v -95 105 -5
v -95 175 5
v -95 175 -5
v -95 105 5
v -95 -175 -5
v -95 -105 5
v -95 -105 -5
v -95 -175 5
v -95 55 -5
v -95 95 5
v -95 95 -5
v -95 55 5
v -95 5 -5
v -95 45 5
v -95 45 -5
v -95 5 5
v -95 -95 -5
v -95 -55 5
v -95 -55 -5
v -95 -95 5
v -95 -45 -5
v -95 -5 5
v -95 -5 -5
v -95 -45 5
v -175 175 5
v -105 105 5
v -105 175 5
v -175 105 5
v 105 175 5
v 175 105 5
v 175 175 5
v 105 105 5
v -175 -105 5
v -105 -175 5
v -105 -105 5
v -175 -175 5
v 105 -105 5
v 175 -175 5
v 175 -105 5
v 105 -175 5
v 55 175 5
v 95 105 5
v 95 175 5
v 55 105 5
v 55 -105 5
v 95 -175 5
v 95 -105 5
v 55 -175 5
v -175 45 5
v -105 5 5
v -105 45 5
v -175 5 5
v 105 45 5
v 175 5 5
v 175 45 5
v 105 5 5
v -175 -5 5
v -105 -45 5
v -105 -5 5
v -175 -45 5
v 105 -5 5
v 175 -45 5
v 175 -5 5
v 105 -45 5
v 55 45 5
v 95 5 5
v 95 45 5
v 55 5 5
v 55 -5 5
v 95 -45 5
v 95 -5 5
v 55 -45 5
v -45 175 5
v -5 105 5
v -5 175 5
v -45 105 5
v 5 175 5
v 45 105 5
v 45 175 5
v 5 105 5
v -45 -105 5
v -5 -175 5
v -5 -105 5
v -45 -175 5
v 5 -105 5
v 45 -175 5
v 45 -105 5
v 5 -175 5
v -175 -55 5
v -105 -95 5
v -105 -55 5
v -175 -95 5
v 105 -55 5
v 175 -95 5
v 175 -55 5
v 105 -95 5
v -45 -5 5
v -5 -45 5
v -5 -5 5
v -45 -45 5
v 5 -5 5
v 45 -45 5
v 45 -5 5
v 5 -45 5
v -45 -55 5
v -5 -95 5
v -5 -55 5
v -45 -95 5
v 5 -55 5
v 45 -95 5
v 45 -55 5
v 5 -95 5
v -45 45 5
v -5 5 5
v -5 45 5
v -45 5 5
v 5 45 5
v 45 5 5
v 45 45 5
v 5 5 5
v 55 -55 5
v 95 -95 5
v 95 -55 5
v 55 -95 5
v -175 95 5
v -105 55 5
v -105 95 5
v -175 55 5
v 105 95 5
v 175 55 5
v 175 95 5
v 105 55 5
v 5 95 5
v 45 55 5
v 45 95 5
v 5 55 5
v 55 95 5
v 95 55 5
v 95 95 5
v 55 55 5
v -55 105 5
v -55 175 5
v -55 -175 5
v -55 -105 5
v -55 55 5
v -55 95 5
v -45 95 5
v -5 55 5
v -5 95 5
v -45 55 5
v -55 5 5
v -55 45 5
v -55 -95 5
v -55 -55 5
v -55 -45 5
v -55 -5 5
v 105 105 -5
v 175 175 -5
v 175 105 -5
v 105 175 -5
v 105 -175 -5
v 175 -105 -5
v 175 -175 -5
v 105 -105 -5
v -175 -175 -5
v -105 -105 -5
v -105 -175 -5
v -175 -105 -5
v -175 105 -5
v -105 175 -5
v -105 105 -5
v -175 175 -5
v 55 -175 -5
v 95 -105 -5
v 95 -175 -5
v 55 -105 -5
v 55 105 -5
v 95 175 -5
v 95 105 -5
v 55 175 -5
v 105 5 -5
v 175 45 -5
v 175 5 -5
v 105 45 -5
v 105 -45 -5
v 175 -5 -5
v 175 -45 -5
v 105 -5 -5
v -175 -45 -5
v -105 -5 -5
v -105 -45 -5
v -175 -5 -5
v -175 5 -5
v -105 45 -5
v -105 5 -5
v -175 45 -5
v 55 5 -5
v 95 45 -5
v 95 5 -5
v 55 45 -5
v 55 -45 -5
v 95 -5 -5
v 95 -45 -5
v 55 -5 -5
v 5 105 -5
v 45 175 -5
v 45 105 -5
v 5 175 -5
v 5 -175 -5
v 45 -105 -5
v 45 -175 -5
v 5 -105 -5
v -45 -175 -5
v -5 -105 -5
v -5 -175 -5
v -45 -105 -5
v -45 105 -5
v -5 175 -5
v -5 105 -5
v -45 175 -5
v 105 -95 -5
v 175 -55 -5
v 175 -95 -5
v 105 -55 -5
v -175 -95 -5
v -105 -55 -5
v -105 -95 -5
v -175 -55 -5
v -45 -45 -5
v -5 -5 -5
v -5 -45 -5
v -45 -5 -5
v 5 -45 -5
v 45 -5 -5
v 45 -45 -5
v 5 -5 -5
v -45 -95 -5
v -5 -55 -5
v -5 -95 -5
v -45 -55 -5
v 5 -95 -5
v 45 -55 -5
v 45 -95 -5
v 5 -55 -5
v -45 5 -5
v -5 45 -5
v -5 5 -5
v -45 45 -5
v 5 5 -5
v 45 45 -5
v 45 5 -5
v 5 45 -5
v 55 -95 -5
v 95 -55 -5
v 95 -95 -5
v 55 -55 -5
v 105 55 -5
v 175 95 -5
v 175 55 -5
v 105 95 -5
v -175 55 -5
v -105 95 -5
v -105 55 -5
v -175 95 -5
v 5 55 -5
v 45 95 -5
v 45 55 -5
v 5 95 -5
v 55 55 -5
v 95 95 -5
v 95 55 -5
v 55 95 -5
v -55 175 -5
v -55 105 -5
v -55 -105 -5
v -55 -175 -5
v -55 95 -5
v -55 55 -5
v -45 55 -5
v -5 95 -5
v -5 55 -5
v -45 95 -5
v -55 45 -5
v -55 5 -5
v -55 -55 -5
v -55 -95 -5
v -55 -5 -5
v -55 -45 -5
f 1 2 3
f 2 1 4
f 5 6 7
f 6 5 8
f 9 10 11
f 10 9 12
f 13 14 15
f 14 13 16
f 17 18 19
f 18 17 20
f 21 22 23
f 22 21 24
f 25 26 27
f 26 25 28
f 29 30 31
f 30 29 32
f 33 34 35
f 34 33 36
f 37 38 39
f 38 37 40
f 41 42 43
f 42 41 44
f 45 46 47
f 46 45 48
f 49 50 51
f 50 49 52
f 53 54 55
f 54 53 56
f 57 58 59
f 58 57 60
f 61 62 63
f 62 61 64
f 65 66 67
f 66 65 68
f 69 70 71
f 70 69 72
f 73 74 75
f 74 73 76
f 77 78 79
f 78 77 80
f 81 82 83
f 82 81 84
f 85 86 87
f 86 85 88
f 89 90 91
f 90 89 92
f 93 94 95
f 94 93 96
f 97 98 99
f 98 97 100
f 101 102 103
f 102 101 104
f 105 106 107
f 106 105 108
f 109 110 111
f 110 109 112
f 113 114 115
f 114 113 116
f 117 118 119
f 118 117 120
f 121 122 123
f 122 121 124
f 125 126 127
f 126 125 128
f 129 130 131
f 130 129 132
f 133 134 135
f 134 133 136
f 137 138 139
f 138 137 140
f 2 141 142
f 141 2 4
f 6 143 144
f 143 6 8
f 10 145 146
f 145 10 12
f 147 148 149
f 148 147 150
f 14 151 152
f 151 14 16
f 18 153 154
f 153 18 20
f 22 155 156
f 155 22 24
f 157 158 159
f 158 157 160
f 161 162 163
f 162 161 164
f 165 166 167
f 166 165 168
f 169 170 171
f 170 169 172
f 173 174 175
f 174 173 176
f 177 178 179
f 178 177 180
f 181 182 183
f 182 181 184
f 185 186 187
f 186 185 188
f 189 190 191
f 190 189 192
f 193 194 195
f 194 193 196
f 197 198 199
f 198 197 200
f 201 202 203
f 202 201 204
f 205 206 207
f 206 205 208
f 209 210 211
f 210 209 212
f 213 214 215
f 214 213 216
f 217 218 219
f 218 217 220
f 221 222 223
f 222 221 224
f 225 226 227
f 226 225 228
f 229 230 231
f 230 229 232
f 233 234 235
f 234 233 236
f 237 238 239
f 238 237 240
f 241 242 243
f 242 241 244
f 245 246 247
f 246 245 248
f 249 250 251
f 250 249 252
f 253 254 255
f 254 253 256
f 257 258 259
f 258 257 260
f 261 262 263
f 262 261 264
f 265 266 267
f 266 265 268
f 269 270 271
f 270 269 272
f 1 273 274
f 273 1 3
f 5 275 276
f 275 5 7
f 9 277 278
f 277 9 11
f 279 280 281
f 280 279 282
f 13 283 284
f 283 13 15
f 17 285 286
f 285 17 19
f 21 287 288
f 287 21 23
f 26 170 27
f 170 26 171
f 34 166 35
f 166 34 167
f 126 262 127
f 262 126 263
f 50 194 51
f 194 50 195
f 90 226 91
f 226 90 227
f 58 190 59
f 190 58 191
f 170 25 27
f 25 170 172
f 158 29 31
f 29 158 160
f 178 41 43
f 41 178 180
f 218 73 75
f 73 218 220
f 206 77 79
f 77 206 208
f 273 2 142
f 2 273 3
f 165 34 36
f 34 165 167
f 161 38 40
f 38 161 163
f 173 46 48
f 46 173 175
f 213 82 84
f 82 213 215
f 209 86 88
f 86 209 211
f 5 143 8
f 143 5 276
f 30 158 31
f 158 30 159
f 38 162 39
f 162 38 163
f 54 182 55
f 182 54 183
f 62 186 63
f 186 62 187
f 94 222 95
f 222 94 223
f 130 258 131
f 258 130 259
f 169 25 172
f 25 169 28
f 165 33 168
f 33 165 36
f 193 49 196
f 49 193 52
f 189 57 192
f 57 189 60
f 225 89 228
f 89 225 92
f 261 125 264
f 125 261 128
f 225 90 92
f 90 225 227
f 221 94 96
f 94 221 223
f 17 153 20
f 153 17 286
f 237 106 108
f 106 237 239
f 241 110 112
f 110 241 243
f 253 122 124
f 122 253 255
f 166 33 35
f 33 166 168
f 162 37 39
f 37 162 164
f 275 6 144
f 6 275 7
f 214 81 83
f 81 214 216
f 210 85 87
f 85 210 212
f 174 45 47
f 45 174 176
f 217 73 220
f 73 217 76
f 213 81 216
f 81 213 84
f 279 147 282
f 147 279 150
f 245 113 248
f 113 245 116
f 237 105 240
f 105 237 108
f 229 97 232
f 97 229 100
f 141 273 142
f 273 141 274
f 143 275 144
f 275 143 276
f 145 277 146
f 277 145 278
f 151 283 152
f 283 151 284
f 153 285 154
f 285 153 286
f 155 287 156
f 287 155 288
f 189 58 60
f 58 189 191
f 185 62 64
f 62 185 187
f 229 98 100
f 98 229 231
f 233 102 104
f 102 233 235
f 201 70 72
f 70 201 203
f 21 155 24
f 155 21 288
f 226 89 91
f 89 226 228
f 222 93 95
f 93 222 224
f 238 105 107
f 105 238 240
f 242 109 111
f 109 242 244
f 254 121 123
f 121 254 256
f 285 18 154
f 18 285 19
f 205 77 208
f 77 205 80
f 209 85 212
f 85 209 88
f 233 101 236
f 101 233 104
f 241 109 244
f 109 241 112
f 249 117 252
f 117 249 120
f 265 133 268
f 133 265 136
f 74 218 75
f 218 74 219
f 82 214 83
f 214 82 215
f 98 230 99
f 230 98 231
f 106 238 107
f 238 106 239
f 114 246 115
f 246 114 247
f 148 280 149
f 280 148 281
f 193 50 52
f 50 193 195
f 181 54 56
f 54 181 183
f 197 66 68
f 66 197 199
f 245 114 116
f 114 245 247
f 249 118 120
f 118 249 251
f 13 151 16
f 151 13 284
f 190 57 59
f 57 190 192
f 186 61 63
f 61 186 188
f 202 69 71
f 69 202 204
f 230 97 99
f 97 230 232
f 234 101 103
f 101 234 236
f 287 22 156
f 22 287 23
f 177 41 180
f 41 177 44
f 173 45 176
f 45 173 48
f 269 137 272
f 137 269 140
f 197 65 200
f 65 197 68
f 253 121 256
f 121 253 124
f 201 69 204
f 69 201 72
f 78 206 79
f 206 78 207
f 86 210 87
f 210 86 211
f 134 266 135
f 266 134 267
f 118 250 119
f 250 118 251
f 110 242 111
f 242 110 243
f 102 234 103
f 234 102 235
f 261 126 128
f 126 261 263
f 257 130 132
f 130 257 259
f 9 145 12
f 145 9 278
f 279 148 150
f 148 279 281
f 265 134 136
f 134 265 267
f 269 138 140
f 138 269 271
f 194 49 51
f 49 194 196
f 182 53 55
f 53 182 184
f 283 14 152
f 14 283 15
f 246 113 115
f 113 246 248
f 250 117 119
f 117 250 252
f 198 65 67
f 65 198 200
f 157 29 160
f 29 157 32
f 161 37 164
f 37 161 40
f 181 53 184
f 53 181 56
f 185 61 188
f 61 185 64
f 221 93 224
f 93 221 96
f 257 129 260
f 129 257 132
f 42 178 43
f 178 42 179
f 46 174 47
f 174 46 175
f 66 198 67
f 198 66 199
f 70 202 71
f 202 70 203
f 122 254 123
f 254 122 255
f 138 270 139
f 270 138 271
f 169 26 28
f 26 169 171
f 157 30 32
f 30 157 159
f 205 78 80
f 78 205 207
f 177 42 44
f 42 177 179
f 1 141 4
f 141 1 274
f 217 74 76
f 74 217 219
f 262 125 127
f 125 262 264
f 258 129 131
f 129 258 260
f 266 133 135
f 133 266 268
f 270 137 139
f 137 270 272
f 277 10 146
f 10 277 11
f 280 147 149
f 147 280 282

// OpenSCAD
// OpenSCAD file
// Base of the cage
difference() {
  cube([350, 350, 10], center = true);
  for (i = [-2:2]) {
    translate([i * 50, 0, 0]) cube([10, 350, 10], center = true);
    translate([0, i * 50, 0]) cube([350, 10, 10], center = true);
  }
  translate([0, 0, 5]) cylinder(h = 10, r = 3, $fn = 100);
}
